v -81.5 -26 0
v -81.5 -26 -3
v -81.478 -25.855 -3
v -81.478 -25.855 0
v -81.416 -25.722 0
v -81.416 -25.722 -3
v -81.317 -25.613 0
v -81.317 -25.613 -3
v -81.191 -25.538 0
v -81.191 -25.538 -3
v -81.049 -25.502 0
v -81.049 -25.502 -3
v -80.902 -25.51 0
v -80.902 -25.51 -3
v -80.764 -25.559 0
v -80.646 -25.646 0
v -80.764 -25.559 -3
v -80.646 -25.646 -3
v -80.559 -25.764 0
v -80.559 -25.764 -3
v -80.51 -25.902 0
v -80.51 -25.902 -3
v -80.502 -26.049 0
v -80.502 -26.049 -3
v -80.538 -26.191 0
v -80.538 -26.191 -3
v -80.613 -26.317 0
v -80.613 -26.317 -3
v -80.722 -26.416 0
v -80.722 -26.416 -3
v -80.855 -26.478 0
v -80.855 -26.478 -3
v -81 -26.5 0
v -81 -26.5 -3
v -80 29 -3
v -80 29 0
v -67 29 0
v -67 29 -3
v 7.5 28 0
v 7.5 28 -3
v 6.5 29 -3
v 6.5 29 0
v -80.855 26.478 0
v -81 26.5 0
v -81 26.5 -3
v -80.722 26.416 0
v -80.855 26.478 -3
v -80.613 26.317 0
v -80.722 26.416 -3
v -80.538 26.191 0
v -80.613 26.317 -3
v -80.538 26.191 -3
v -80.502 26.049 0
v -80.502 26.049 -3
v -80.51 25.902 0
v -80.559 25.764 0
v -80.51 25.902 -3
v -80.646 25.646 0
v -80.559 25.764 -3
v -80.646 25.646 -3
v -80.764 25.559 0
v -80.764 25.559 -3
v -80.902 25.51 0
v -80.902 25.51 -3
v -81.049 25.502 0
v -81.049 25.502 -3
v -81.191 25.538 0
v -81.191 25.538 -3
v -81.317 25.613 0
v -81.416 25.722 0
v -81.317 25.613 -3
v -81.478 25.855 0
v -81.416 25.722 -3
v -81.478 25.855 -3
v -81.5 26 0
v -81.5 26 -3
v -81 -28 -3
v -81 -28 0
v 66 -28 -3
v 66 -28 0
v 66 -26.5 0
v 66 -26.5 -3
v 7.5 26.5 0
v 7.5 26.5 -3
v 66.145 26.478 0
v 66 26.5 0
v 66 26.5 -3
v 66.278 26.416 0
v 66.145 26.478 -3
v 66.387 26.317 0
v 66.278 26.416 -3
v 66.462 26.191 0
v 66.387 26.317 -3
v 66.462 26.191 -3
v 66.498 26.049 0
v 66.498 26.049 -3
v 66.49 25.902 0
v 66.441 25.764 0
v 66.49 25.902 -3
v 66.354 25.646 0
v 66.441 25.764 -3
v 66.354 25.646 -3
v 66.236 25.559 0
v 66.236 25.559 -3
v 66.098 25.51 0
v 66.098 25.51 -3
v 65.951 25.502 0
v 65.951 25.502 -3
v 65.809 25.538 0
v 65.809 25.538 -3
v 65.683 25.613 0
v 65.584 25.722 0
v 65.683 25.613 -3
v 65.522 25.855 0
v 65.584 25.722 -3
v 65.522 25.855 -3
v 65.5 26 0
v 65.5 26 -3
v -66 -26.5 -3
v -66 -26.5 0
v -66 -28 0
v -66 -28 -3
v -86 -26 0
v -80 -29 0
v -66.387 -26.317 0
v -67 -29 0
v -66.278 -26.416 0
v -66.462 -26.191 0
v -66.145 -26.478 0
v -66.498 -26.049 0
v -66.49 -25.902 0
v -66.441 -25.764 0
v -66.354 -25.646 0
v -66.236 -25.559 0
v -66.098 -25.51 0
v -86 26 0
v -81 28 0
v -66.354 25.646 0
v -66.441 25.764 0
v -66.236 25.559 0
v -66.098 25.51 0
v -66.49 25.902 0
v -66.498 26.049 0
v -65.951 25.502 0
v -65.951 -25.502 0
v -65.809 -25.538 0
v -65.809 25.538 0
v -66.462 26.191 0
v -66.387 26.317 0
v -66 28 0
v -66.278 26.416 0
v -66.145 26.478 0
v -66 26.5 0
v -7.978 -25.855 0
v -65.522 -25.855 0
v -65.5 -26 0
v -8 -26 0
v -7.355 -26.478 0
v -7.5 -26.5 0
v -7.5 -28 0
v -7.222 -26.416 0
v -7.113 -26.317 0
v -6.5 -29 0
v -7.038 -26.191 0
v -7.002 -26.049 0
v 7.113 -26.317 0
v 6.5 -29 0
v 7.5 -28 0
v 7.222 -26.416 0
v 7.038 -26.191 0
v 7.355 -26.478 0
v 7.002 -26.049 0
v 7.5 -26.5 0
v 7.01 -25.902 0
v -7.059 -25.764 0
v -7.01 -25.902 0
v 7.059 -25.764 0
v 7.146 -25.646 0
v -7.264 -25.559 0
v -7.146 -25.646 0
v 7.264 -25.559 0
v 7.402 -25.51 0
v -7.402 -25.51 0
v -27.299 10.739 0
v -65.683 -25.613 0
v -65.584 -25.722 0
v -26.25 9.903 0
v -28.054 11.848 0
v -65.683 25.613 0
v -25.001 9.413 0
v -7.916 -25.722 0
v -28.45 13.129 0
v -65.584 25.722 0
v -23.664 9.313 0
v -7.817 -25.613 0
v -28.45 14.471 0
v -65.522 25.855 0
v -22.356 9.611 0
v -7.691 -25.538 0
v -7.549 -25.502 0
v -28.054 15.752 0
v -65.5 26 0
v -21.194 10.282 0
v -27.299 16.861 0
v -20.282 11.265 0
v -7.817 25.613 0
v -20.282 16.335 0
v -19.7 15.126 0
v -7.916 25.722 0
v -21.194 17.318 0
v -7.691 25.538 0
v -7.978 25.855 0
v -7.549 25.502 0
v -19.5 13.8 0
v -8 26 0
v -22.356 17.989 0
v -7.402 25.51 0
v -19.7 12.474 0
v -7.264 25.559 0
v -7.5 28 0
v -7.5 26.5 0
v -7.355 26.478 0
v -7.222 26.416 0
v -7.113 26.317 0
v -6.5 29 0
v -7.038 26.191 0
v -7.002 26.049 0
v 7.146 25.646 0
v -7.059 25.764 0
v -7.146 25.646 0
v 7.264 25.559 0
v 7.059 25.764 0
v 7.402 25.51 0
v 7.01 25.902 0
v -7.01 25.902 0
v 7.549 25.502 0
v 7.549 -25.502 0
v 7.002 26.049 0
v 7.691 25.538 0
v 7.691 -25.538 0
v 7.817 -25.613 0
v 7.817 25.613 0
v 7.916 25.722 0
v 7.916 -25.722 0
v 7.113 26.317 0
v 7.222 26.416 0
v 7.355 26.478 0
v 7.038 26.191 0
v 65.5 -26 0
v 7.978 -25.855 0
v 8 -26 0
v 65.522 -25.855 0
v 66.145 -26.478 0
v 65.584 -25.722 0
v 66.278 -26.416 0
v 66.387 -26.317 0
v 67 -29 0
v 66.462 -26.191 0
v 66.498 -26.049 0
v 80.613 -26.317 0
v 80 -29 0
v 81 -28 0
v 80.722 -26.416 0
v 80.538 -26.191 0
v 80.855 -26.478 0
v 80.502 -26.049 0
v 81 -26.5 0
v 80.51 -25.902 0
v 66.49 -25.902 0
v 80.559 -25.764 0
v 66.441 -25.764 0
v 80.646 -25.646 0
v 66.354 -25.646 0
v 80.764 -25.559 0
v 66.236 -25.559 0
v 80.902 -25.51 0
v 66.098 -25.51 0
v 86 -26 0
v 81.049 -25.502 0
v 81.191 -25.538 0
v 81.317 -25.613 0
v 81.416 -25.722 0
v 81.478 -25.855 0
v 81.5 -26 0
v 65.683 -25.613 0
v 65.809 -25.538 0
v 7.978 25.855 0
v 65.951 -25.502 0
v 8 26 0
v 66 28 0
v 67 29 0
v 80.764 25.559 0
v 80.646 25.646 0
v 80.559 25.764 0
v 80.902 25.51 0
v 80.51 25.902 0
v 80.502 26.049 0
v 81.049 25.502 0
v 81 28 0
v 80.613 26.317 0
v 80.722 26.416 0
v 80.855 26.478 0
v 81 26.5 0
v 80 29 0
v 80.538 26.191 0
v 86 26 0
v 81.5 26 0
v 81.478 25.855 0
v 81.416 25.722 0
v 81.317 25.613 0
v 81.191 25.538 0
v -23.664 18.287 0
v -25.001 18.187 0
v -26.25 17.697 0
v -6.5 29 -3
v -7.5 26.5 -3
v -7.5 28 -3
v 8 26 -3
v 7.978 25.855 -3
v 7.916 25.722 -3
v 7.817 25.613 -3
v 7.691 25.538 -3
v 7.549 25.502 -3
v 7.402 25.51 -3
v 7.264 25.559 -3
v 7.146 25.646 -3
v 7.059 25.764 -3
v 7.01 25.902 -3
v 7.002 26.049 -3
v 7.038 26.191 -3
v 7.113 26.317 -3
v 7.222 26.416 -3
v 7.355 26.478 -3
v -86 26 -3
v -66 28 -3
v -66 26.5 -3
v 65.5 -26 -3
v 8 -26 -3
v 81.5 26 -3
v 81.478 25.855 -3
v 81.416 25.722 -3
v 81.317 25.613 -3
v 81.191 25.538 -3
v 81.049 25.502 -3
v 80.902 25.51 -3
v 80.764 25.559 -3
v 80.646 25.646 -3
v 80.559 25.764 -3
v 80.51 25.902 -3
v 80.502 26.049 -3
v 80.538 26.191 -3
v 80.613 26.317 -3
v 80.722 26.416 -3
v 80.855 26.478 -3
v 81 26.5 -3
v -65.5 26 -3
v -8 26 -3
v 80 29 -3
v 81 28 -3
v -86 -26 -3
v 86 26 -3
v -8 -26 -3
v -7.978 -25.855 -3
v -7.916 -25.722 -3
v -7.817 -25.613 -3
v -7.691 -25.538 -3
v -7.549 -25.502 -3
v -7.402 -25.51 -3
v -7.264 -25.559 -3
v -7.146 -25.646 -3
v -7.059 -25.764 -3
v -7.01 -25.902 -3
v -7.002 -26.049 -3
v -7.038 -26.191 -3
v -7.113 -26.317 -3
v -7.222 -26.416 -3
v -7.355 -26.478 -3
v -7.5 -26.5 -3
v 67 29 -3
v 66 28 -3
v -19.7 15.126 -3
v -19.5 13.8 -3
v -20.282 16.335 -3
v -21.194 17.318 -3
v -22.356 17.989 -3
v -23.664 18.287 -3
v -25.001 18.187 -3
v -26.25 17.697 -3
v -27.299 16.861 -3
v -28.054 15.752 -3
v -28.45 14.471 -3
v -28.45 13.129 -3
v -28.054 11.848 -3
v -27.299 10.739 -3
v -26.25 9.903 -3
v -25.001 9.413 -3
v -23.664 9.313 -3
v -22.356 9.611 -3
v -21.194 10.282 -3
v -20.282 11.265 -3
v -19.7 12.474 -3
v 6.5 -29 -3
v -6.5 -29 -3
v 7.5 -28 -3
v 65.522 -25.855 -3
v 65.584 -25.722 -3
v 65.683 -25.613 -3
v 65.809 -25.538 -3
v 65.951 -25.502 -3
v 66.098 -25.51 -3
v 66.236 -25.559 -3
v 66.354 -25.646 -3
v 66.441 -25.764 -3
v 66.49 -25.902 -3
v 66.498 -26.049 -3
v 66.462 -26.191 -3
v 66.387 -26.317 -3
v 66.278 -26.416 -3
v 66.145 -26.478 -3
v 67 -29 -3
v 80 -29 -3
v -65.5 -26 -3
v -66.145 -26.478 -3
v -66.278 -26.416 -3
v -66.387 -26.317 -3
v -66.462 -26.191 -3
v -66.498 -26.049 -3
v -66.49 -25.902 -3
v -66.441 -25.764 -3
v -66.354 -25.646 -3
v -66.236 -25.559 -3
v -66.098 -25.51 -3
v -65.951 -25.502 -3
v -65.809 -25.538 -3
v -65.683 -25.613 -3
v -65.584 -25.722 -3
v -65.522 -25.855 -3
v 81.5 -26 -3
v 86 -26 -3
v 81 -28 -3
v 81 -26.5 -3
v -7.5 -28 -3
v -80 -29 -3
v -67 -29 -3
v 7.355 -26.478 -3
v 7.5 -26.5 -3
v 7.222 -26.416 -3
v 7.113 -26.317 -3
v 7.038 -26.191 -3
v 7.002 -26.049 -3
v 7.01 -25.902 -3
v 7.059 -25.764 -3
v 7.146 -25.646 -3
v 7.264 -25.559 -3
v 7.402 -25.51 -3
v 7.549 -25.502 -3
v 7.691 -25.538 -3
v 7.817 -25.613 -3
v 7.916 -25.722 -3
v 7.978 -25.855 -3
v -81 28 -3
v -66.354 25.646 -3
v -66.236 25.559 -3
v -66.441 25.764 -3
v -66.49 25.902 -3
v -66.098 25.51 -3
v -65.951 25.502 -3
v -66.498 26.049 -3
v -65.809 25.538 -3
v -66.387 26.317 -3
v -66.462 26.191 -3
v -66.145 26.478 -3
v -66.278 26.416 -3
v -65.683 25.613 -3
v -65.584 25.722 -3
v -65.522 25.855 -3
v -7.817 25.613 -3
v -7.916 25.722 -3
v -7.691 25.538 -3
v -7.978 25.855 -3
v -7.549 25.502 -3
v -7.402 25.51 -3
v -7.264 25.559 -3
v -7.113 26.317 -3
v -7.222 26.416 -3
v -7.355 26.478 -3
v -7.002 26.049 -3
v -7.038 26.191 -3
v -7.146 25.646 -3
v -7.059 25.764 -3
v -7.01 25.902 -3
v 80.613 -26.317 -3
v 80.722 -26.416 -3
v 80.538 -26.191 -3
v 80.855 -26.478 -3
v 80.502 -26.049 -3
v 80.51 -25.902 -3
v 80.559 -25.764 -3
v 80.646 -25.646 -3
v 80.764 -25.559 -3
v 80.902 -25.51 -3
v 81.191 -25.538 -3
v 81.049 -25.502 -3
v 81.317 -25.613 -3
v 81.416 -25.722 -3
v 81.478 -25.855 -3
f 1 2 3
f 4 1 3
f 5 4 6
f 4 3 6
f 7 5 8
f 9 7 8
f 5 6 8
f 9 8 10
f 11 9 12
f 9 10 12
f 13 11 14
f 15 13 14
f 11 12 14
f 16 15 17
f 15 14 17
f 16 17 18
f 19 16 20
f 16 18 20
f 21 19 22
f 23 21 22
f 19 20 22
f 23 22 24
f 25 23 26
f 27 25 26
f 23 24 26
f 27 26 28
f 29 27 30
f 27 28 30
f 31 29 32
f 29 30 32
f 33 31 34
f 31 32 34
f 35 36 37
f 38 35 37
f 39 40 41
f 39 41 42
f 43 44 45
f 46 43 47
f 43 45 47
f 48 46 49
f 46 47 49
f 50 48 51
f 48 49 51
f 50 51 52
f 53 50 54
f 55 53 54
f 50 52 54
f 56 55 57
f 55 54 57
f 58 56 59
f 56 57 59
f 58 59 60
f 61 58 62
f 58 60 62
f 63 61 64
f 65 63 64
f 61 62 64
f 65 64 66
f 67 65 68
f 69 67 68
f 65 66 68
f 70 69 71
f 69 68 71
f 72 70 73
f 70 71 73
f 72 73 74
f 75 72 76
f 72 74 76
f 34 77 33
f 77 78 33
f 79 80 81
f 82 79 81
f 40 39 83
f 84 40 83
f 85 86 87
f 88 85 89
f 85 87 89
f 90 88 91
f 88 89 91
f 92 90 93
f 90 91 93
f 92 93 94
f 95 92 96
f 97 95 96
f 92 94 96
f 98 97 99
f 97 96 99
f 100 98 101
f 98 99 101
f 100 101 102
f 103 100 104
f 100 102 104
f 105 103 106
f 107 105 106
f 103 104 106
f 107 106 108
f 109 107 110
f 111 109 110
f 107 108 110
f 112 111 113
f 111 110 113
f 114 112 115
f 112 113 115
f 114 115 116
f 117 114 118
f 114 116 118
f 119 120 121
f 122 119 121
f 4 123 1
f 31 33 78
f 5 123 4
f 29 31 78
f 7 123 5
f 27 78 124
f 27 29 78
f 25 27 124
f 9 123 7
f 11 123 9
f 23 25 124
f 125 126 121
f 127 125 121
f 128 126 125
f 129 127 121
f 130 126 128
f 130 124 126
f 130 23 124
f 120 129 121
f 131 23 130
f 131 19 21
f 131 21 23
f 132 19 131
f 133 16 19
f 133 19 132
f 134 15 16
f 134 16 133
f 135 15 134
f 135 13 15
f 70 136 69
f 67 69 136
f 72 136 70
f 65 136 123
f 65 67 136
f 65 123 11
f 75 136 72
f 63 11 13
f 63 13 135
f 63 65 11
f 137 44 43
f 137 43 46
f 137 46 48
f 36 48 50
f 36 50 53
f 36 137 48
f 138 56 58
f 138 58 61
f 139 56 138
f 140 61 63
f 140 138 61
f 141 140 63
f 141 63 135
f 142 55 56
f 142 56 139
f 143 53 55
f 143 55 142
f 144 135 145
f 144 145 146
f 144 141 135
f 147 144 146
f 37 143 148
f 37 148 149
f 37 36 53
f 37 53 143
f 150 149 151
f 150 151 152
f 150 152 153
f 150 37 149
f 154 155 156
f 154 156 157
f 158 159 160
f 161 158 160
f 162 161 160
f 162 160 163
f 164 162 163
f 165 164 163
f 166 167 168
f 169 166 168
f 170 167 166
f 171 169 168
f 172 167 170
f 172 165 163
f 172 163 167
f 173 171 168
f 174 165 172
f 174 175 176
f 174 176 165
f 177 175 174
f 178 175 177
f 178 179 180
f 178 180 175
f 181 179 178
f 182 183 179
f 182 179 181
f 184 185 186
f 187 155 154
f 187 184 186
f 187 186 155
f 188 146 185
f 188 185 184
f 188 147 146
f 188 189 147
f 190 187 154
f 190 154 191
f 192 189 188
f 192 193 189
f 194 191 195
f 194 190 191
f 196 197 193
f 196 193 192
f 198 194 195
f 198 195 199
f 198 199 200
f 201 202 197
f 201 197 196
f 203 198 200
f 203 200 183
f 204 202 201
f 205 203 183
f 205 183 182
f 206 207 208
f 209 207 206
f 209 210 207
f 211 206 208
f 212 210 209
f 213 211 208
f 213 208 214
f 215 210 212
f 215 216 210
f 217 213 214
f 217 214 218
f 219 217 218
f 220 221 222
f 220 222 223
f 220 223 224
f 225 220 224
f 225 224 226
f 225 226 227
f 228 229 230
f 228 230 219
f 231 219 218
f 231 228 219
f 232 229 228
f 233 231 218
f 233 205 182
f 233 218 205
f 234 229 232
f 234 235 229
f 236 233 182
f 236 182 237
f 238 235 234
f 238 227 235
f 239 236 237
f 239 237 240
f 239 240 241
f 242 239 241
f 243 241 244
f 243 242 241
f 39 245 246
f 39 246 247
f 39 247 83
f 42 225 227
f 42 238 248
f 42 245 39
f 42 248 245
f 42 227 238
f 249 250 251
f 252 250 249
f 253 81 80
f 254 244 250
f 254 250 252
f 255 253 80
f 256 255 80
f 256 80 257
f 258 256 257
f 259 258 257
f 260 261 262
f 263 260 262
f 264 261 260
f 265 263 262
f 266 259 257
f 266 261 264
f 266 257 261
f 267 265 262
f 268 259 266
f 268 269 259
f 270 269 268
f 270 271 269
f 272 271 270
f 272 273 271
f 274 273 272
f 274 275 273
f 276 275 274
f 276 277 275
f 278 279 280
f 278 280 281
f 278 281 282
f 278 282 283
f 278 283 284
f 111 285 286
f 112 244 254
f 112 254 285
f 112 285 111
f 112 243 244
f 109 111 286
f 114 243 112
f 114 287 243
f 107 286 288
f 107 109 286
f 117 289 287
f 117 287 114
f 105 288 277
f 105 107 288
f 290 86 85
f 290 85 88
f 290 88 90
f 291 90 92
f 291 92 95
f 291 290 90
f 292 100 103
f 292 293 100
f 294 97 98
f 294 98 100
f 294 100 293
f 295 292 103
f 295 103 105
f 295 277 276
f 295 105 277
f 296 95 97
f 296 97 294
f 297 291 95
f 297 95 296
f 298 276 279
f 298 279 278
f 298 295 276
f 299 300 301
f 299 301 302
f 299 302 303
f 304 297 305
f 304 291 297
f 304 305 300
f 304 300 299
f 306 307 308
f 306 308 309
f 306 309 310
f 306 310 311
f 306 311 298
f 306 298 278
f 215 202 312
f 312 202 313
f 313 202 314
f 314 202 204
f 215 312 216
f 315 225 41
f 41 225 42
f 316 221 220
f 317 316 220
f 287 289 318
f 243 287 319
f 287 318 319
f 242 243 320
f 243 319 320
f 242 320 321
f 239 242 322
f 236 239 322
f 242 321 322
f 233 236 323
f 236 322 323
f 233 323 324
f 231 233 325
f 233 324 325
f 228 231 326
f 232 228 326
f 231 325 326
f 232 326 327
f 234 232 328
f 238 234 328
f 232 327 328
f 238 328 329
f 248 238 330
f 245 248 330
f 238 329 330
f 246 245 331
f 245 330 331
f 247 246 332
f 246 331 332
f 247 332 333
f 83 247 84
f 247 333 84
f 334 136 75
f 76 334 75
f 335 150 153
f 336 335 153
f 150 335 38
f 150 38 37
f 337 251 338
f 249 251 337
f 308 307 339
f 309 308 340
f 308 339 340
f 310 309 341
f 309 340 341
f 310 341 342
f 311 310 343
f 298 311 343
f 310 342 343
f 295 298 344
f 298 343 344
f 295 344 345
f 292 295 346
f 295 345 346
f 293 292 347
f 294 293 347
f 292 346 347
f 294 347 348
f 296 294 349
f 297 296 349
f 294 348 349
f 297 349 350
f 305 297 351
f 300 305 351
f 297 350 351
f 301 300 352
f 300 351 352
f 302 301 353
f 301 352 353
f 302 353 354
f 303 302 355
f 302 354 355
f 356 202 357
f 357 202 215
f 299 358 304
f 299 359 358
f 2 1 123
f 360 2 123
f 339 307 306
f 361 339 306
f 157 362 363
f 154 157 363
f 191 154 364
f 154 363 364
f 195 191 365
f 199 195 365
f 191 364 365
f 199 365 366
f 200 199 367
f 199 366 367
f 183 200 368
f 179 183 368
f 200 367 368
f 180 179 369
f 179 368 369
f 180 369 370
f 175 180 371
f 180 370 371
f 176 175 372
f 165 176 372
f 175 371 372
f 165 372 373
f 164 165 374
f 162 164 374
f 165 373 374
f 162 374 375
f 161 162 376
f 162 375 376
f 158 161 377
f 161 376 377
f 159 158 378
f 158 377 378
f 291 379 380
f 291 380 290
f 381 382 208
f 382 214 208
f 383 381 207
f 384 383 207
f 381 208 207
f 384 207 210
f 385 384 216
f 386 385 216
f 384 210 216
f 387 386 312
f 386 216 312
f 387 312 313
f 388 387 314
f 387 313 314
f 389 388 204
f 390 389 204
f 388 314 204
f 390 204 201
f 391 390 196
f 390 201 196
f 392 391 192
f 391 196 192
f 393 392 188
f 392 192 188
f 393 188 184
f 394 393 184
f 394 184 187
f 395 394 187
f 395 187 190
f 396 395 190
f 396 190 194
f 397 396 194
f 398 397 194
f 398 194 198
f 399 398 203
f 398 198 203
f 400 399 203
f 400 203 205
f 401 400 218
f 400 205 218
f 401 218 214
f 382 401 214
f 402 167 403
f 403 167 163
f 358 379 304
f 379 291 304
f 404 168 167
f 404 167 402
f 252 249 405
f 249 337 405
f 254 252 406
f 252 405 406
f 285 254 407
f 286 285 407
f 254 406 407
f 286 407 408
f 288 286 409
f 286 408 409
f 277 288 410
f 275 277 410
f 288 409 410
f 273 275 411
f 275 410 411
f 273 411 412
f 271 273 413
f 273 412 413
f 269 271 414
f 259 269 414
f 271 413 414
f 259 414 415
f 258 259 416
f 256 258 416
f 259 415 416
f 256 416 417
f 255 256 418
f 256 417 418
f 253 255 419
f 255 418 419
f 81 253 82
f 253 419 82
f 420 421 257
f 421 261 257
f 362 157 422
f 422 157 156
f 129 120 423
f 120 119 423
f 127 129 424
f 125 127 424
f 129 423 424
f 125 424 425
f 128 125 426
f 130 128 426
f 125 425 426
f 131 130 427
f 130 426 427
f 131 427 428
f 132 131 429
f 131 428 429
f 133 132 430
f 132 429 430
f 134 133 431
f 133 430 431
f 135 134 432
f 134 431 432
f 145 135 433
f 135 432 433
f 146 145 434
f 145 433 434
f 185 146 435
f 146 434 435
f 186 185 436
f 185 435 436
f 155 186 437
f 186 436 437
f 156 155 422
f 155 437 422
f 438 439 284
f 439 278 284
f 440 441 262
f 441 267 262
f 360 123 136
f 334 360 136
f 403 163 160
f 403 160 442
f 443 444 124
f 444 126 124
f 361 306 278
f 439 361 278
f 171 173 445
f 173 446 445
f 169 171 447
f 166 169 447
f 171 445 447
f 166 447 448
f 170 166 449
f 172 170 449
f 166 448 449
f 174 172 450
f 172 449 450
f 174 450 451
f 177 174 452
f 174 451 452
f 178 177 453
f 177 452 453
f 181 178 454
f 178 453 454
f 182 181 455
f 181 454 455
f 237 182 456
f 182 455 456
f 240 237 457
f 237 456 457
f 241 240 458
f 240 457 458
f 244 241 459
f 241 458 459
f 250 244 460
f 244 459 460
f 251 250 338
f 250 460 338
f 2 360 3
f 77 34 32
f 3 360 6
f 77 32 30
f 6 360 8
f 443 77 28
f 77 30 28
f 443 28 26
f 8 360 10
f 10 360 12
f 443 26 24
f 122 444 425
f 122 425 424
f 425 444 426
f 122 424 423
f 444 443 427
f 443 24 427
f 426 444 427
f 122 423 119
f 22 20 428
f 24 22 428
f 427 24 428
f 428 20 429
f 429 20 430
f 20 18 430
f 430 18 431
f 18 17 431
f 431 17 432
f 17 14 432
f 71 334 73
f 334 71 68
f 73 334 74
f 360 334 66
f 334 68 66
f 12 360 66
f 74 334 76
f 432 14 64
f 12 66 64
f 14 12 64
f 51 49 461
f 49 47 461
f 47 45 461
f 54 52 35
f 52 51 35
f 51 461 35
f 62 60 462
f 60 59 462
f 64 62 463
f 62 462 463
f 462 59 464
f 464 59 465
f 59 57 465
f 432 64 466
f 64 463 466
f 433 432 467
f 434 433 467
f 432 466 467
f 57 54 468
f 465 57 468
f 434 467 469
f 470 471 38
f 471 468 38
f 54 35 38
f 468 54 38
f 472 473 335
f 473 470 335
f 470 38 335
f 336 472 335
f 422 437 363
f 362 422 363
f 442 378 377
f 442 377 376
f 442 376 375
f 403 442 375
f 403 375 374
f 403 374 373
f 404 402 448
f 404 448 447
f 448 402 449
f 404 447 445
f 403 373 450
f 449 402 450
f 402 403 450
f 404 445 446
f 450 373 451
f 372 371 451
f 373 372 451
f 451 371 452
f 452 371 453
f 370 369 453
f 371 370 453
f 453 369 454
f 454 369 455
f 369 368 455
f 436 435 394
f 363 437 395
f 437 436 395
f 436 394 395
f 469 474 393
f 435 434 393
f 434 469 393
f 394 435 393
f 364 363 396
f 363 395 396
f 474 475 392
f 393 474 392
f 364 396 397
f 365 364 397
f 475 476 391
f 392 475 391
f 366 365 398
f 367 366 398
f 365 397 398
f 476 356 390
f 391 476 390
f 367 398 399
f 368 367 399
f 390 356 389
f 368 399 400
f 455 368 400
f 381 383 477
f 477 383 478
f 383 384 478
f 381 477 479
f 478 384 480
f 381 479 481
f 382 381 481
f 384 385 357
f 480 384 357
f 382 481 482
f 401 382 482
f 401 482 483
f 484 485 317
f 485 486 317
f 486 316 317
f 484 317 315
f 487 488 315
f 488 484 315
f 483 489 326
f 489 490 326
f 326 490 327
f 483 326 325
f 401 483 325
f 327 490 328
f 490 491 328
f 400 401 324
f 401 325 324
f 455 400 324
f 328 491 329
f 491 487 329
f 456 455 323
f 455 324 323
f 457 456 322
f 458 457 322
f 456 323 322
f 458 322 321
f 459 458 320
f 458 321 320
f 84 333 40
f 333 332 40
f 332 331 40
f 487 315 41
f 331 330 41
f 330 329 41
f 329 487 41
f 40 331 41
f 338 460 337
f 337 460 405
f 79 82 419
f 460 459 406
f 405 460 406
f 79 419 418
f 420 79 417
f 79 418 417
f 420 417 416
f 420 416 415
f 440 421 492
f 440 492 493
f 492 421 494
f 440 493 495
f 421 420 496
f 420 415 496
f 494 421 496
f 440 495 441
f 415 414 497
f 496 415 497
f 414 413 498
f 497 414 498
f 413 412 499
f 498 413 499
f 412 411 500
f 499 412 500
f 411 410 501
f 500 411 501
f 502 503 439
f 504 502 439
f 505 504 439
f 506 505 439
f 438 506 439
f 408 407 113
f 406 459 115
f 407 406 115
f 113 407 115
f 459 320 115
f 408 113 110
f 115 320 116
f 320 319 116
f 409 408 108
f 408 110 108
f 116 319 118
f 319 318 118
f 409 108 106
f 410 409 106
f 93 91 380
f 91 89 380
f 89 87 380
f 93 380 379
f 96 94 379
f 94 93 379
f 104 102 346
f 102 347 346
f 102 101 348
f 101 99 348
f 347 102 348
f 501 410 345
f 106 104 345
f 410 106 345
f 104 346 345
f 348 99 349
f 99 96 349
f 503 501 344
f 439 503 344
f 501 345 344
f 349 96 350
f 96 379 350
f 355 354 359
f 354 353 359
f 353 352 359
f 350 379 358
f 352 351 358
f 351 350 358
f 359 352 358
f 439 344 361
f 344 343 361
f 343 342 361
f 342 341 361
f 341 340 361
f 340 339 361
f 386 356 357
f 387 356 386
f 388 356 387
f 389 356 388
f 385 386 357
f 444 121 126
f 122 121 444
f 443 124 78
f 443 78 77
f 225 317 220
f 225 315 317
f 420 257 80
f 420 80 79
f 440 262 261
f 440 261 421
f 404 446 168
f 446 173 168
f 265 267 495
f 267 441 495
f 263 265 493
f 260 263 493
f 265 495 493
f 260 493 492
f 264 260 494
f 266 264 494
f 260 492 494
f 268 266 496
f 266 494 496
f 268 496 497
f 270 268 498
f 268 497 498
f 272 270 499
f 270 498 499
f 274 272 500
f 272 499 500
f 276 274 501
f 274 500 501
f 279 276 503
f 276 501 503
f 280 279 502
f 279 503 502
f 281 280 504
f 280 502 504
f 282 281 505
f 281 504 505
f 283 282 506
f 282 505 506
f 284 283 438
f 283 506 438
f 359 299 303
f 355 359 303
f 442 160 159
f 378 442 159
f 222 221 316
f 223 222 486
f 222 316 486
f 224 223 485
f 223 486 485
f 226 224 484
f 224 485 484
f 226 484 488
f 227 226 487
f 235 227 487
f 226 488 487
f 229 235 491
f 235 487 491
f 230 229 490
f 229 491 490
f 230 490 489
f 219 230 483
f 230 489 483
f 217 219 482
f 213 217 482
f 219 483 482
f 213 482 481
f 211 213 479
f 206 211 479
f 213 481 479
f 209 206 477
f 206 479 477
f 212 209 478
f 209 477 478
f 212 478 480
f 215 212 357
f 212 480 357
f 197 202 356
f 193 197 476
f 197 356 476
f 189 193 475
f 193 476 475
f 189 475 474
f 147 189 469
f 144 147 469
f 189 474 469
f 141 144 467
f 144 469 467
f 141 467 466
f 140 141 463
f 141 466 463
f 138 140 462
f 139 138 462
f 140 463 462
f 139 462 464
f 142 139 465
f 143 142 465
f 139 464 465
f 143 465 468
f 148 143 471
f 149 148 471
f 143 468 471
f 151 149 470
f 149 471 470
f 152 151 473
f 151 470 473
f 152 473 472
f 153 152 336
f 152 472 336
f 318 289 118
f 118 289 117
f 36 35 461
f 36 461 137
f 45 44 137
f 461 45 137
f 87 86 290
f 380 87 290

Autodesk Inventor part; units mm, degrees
ref_plane "Plan YZ" through (0, 0, 0) normal (1, 0, 0) x (0, 1, 0)
ref_plane "Plan XZ" through (0, 0, 0) normal (0, 1, 0) x (-1, 0, 0)
ref_plane "Plan XY" through (0, 0, 0) normal (0, 0, 1) x (1, 0, 0)
sketch "Esquisse7" plane through (0, 0, 0) normal (0, 0, 1) x (1, 0, 0)
  line L0 (-86, -26) -> (-86, 26)
  line L1 (-86, 26) -> (-81, 26)
  line L2 (-81, 26) -> (-81, 29)
  line L3 (-81, 29) -> (-66, 29)
  line L4 (-66, 29) -> (-66, 26)
  line L5 (-66, 26) -> (-7.5, 26)
  line L6 (-7.5, 26) -> (-7.5, 29)
  line L7 (-7.5, 29) -> (7.5, 29)
  line L8 (7.5, 29) -> (7.5, 26)
  line L9 (7.5, 26) -> (66, 26)
  line L10 (66, 26) -> (66, 29)
  line L11 (66, 29) -> (81, 29)
  line L12 (81, 29) -> (81, 26)
  line L13 (81, 26) -> (86, 26)
  line L14 (86, 26) -> (86, -26)
  line L15 (86, -26) -> (81, -26)
  line L16 (81, -26) -> (81, -29)
  line L17 (81, -29) -> (66, -29)
  line L18 (66, -29) -> (66, -26)
  line L19 (7.5, -26) -> (7.5, -29)
  line L20 (7.5, -26) -> (66, -26)
  line L21 (7.5, -29) -> (-7.5, -29)
  line L22 (-7.5, -29) -> (-7.5, -26)
  line L23 (-7.5, -26) -> (-66, -26)
  line L24 (-66, -26) -> (-66, -29)
  line L25 (-66, -29) -> (-81, -29)
  line L26 (-81, -29) -> (-81, -26)
  line L27 (-81, -26) -> (-86, -26)
  line L28 (0, -40.6) -> (0, 40.6) construction
  line L29 (-120.4, 0) -> (120.4, 0) construction
  dimension "d33" = 52
  dimension "d34" = 15
  dimension "d35" = 3
  dimension "d36" = 5
  dimension "d65" = 172
extrude "Extrusion2" add sketch "Esquisse7" against normal blind 3
sketch "Esquisse8" plane through (0, 0, 0) normal (0, 0, 1) x (1, 0, 0)
  point P0 (0, 0)
  point P1 (7.5, 26)
  point P2 (-7.5, 26)
  point P3 (-81, 26)
  point P4 (-66, 26)
  point P5 (-81, -26)
  point P6 (-66, -26)
  point P7 (-7.5, -26)
  point P8 (7.5, -26)
  point P9 (66, -26)
  point P10 (81, -26)
  point P11 (66, 26)
  point P12 (81, 26)
  point P13 (81, 26)
  point P14 (66, -26)
  point P15 (81, 26)
hole "Perçage2" at (7.5, 26, 0) at (-7.5, 26, 0) at (-81, 26, 0) at (-66, 26, 0) at (-81, -26, 0) at (-66, -26, 0) at (-7.5, -26, 0) at (7.5, -26, 0) at (66, -26, 0) at (81, -26, 0) at (66, 26, 0) at (81, 26, 0) direction (0, 0, -1) diameter 1 end through all
sketch "Esquisse9" plane through (0, 0, 0) normal (0, 0, 1) x (1, 0, 0)
  circle A0 centre (-24, 13.8) radius 4.5
  line L0 (-86, -26) -> (-86, 26) projected
  line L1 (-65.5, 26) -> (-8, 26) projected
  point P0 (0, 0)
  point P1 (-90, -24)
  point P2 (-90, 24)
  dimension "d62" = 62
  dimension "d63" = 12.2
  dimension "d64" = 9
extrude "Extrusion3" cut sketch "Esquisse9" against normal through all
chamfer "Chanfrein3" distance 1 angle 45 12 edges at (-81, -29, -1.5) (-66, -29, -1.5) (-81, 29, -1.5) (-66, 29, -1.5) (-7.5, 29, -1.5) (7.5, 29, -1.5) (66, 29, -1.5) (81, 29, -1.5) (66, -29, -1.5) (81, -29, -1.5) (-7.5, -29, -1.5) (7.5, -29, -1.5)
properties part number "P1704_202" material "Plastique PMMA"
